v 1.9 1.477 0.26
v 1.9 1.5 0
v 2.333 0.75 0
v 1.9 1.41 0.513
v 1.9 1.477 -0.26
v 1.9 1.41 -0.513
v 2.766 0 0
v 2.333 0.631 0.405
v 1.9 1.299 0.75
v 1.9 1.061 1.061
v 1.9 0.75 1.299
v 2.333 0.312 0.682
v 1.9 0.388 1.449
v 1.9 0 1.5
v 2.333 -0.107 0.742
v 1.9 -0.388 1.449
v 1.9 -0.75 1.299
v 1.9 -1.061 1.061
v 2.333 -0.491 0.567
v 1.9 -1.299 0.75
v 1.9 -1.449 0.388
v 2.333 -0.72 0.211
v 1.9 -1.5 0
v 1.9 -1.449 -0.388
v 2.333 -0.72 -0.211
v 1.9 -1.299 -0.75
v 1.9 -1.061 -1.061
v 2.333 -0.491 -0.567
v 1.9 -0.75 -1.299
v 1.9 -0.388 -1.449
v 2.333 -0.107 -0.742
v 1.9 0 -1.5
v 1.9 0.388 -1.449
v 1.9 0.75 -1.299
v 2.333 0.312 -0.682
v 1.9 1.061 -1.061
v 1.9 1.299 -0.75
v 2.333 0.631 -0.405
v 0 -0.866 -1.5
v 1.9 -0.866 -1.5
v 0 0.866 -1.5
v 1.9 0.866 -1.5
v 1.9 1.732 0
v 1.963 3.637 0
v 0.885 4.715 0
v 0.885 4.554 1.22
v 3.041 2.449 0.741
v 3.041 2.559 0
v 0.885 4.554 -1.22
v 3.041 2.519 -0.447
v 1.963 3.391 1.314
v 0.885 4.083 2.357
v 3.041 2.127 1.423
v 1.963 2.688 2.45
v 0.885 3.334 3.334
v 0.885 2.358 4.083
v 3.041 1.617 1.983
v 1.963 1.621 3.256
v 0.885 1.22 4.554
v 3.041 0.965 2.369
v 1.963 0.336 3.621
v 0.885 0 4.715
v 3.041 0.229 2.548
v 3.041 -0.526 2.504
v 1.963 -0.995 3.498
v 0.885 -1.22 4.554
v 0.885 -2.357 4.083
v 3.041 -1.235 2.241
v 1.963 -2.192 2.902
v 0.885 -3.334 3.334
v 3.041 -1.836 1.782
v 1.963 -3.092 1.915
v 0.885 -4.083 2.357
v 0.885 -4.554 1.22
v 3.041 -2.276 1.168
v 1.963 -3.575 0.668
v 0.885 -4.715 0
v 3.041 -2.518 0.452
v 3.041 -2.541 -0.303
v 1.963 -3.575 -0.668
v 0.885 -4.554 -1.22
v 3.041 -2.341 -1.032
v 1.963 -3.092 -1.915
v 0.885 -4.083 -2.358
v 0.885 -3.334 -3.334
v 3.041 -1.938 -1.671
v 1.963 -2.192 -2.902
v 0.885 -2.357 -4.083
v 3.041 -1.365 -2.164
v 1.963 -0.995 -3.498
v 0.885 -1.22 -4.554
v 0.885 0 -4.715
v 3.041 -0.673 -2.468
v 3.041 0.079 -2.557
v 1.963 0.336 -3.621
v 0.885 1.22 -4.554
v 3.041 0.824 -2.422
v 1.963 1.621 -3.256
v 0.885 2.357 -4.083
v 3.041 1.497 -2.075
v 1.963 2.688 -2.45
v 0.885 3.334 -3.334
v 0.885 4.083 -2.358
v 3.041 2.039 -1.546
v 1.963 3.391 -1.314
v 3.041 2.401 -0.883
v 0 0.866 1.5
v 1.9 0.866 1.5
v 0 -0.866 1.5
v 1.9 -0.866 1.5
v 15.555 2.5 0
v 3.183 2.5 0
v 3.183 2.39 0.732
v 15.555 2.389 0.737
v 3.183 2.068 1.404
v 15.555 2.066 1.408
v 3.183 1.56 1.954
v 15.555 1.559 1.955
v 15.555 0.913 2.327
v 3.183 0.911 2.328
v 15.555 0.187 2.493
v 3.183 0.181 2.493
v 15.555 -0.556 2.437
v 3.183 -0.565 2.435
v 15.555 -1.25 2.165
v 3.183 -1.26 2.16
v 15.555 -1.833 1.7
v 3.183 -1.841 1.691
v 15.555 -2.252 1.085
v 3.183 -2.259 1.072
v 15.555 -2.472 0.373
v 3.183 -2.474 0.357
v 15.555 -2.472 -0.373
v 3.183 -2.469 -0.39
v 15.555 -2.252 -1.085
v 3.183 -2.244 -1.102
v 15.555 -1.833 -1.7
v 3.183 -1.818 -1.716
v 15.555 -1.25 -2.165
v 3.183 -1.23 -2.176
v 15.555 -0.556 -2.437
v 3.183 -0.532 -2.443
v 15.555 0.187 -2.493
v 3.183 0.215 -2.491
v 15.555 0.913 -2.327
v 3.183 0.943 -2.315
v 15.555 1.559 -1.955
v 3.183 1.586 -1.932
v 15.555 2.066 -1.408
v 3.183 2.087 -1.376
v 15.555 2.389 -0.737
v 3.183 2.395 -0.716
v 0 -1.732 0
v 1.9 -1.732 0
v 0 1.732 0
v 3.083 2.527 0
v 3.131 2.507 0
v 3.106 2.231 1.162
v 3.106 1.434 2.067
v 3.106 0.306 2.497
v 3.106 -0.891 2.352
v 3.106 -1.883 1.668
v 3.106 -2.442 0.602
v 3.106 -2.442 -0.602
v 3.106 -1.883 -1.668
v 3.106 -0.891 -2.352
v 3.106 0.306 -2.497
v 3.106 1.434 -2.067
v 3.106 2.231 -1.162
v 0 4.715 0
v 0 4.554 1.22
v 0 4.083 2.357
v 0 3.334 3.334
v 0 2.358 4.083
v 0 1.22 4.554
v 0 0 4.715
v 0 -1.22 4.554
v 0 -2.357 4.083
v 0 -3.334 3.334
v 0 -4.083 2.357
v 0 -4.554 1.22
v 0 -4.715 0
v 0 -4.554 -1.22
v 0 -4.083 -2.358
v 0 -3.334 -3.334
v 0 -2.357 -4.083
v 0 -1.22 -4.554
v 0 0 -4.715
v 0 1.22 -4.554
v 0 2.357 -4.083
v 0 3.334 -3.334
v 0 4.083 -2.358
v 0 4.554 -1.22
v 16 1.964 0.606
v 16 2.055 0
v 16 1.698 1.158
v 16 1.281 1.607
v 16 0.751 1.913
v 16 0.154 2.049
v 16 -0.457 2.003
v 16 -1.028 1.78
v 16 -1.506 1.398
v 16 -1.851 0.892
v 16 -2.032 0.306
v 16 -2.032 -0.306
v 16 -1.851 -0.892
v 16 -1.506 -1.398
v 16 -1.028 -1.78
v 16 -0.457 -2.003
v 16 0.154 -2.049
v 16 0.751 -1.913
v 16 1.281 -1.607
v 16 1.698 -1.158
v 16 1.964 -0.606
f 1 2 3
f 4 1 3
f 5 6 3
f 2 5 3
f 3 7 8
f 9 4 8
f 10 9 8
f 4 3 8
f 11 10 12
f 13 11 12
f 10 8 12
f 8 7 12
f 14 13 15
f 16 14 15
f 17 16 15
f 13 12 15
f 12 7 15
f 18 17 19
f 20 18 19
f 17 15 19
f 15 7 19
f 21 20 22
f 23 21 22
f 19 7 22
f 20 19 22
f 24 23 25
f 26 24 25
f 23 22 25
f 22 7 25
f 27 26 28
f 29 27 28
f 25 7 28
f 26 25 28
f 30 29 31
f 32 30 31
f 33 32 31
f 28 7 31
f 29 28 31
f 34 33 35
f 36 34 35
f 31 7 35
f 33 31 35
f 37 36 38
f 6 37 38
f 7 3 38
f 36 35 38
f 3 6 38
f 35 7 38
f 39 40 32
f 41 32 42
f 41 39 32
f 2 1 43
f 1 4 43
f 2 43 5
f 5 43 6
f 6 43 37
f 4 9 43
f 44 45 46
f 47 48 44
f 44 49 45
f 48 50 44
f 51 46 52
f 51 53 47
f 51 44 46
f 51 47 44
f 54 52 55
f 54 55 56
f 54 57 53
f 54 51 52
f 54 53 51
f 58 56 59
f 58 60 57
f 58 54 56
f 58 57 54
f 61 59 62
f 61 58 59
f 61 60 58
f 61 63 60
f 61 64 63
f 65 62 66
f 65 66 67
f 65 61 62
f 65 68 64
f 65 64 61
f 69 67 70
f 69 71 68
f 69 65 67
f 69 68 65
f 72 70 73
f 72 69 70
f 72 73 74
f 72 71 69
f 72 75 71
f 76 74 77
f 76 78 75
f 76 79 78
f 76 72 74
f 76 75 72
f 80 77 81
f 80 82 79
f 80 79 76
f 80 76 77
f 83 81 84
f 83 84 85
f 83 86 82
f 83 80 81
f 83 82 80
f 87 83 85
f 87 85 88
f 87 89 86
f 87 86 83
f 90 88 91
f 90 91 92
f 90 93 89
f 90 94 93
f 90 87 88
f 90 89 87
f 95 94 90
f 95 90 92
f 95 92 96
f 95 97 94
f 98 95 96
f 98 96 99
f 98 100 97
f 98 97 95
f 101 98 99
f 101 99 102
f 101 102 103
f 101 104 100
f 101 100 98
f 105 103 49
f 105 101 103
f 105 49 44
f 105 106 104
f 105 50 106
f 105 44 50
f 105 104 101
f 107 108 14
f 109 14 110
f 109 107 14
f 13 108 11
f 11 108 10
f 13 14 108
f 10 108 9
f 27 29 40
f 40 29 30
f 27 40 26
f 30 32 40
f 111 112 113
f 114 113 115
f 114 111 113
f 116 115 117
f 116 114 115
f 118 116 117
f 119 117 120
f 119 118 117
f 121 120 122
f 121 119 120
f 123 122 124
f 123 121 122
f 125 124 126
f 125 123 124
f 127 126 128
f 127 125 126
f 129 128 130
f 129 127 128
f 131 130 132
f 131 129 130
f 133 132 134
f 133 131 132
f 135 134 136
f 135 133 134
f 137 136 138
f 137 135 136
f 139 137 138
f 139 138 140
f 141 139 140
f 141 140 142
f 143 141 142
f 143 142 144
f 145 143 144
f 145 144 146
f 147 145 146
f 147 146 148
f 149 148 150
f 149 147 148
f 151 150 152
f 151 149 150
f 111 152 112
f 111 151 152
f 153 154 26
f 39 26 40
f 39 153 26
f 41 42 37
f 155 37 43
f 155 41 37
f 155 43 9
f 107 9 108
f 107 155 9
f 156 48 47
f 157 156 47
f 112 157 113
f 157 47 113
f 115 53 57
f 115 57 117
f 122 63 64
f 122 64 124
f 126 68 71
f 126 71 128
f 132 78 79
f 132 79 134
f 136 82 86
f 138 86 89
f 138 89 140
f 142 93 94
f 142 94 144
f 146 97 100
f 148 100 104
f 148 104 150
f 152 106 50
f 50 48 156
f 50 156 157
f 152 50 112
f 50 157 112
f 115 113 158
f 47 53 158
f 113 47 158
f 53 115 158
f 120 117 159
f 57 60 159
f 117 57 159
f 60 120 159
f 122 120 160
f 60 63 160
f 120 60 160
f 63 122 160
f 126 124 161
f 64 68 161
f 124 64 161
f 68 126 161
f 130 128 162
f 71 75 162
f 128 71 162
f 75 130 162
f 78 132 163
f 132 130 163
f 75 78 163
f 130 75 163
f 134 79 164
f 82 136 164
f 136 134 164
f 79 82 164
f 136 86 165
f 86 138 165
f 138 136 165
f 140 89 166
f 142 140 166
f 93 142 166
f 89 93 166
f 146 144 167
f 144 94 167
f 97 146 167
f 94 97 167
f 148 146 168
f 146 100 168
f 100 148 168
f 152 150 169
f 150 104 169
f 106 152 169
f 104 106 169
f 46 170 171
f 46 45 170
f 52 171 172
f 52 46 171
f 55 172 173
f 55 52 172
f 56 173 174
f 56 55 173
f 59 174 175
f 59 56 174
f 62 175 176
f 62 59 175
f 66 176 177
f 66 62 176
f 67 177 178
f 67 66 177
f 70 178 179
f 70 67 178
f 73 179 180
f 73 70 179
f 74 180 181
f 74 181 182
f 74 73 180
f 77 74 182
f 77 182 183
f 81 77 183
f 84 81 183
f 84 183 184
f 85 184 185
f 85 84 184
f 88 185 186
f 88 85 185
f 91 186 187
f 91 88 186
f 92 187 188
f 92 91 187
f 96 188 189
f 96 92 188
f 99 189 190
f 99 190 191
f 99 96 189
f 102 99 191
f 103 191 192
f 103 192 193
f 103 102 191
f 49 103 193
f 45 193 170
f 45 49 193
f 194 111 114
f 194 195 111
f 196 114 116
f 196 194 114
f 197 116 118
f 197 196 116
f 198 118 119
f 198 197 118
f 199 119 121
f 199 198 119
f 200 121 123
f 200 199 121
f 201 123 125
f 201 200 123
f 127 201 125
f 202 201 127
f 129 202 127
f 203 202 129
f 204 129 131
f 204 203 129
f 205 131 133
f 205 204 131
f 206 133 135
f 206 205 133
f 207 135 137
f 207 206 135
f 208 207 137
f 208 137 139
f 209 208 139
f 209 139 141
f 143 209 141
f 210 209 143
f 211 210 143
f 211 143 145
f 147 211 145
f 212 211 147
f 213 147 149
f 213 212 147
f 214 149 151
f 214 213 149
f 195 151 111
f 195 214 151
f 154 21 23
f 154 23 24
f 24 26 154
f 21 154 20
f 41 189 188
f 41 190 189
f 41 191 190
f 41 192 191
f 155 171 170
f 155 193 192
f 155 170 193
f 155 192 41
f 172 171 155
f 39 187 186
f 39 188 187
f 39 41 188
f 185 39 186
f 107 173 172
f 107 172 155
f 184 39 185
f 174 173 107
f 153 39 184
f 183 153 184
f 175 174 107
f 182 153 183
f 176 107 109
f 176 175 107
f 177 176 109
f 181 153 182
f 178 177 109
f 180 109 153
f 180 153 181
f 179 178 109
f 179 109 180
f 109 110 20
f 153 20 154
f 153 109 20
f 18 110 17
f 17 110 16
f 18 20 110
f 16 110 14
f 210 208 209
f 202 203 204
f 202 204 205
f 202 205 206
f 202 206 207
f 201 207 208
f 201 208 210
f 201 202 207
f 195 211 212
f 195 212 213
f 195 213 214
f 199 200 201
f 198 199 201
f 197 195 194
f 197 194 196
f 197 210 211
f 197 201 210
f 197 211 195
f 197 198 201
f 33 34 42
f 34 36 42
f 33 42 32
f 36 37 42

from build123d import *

# Parameters (mm, degrees)
FILLET1_R   = 0.2
HEX_2_DEPTH = 1.9


with BuildPart() as part:
    # BodySke → BaseBody (revolve)
    with BuildSketch(Plane.XY):
        Polygon((0, 0), (0, 4.715), (0.885, 4.715), (3.1, 2.5), (15.555, 2.5), (16, 2.055), (16, 0), align=None)
    revolve(axis=Axis((0, 0, 0), (1, 0, 0)))

    # Fillet1
    fillet1_edges = [part.edges().sort_by_distance(p)[0] for p in [
        (3.1, -2.5, 0),
    ]]
    fillet(fillet1_edges, radius=FILLET1_R)

    # Sketch2 → PreBroach (revolve, cut)
    with BuildSketch(Plane.XY):
        Polygon((0, 1.5), (1.9, 1.5), (2.766025404, 0), (0, 0), align=None)
    revolve(axis=Axis((0, 0, 0), (1, 0, 0)), mode=Mode.SUBTRACT)

    # Sketch3 → Hex 2 (cut)
    with BuildSketch(Plane.ZY):
        Polygon((-1.5, -0.866025404), (-1.5, 0.866025404), (0, 1.732050808), (1.5, 0.866025404), (1.5, -0.866025404), (0, -1.732050808), align=None)
    extrude(amount=-HEX_2_DEPTH, mode=Mode.SUBTRACT)


solid = part.part
